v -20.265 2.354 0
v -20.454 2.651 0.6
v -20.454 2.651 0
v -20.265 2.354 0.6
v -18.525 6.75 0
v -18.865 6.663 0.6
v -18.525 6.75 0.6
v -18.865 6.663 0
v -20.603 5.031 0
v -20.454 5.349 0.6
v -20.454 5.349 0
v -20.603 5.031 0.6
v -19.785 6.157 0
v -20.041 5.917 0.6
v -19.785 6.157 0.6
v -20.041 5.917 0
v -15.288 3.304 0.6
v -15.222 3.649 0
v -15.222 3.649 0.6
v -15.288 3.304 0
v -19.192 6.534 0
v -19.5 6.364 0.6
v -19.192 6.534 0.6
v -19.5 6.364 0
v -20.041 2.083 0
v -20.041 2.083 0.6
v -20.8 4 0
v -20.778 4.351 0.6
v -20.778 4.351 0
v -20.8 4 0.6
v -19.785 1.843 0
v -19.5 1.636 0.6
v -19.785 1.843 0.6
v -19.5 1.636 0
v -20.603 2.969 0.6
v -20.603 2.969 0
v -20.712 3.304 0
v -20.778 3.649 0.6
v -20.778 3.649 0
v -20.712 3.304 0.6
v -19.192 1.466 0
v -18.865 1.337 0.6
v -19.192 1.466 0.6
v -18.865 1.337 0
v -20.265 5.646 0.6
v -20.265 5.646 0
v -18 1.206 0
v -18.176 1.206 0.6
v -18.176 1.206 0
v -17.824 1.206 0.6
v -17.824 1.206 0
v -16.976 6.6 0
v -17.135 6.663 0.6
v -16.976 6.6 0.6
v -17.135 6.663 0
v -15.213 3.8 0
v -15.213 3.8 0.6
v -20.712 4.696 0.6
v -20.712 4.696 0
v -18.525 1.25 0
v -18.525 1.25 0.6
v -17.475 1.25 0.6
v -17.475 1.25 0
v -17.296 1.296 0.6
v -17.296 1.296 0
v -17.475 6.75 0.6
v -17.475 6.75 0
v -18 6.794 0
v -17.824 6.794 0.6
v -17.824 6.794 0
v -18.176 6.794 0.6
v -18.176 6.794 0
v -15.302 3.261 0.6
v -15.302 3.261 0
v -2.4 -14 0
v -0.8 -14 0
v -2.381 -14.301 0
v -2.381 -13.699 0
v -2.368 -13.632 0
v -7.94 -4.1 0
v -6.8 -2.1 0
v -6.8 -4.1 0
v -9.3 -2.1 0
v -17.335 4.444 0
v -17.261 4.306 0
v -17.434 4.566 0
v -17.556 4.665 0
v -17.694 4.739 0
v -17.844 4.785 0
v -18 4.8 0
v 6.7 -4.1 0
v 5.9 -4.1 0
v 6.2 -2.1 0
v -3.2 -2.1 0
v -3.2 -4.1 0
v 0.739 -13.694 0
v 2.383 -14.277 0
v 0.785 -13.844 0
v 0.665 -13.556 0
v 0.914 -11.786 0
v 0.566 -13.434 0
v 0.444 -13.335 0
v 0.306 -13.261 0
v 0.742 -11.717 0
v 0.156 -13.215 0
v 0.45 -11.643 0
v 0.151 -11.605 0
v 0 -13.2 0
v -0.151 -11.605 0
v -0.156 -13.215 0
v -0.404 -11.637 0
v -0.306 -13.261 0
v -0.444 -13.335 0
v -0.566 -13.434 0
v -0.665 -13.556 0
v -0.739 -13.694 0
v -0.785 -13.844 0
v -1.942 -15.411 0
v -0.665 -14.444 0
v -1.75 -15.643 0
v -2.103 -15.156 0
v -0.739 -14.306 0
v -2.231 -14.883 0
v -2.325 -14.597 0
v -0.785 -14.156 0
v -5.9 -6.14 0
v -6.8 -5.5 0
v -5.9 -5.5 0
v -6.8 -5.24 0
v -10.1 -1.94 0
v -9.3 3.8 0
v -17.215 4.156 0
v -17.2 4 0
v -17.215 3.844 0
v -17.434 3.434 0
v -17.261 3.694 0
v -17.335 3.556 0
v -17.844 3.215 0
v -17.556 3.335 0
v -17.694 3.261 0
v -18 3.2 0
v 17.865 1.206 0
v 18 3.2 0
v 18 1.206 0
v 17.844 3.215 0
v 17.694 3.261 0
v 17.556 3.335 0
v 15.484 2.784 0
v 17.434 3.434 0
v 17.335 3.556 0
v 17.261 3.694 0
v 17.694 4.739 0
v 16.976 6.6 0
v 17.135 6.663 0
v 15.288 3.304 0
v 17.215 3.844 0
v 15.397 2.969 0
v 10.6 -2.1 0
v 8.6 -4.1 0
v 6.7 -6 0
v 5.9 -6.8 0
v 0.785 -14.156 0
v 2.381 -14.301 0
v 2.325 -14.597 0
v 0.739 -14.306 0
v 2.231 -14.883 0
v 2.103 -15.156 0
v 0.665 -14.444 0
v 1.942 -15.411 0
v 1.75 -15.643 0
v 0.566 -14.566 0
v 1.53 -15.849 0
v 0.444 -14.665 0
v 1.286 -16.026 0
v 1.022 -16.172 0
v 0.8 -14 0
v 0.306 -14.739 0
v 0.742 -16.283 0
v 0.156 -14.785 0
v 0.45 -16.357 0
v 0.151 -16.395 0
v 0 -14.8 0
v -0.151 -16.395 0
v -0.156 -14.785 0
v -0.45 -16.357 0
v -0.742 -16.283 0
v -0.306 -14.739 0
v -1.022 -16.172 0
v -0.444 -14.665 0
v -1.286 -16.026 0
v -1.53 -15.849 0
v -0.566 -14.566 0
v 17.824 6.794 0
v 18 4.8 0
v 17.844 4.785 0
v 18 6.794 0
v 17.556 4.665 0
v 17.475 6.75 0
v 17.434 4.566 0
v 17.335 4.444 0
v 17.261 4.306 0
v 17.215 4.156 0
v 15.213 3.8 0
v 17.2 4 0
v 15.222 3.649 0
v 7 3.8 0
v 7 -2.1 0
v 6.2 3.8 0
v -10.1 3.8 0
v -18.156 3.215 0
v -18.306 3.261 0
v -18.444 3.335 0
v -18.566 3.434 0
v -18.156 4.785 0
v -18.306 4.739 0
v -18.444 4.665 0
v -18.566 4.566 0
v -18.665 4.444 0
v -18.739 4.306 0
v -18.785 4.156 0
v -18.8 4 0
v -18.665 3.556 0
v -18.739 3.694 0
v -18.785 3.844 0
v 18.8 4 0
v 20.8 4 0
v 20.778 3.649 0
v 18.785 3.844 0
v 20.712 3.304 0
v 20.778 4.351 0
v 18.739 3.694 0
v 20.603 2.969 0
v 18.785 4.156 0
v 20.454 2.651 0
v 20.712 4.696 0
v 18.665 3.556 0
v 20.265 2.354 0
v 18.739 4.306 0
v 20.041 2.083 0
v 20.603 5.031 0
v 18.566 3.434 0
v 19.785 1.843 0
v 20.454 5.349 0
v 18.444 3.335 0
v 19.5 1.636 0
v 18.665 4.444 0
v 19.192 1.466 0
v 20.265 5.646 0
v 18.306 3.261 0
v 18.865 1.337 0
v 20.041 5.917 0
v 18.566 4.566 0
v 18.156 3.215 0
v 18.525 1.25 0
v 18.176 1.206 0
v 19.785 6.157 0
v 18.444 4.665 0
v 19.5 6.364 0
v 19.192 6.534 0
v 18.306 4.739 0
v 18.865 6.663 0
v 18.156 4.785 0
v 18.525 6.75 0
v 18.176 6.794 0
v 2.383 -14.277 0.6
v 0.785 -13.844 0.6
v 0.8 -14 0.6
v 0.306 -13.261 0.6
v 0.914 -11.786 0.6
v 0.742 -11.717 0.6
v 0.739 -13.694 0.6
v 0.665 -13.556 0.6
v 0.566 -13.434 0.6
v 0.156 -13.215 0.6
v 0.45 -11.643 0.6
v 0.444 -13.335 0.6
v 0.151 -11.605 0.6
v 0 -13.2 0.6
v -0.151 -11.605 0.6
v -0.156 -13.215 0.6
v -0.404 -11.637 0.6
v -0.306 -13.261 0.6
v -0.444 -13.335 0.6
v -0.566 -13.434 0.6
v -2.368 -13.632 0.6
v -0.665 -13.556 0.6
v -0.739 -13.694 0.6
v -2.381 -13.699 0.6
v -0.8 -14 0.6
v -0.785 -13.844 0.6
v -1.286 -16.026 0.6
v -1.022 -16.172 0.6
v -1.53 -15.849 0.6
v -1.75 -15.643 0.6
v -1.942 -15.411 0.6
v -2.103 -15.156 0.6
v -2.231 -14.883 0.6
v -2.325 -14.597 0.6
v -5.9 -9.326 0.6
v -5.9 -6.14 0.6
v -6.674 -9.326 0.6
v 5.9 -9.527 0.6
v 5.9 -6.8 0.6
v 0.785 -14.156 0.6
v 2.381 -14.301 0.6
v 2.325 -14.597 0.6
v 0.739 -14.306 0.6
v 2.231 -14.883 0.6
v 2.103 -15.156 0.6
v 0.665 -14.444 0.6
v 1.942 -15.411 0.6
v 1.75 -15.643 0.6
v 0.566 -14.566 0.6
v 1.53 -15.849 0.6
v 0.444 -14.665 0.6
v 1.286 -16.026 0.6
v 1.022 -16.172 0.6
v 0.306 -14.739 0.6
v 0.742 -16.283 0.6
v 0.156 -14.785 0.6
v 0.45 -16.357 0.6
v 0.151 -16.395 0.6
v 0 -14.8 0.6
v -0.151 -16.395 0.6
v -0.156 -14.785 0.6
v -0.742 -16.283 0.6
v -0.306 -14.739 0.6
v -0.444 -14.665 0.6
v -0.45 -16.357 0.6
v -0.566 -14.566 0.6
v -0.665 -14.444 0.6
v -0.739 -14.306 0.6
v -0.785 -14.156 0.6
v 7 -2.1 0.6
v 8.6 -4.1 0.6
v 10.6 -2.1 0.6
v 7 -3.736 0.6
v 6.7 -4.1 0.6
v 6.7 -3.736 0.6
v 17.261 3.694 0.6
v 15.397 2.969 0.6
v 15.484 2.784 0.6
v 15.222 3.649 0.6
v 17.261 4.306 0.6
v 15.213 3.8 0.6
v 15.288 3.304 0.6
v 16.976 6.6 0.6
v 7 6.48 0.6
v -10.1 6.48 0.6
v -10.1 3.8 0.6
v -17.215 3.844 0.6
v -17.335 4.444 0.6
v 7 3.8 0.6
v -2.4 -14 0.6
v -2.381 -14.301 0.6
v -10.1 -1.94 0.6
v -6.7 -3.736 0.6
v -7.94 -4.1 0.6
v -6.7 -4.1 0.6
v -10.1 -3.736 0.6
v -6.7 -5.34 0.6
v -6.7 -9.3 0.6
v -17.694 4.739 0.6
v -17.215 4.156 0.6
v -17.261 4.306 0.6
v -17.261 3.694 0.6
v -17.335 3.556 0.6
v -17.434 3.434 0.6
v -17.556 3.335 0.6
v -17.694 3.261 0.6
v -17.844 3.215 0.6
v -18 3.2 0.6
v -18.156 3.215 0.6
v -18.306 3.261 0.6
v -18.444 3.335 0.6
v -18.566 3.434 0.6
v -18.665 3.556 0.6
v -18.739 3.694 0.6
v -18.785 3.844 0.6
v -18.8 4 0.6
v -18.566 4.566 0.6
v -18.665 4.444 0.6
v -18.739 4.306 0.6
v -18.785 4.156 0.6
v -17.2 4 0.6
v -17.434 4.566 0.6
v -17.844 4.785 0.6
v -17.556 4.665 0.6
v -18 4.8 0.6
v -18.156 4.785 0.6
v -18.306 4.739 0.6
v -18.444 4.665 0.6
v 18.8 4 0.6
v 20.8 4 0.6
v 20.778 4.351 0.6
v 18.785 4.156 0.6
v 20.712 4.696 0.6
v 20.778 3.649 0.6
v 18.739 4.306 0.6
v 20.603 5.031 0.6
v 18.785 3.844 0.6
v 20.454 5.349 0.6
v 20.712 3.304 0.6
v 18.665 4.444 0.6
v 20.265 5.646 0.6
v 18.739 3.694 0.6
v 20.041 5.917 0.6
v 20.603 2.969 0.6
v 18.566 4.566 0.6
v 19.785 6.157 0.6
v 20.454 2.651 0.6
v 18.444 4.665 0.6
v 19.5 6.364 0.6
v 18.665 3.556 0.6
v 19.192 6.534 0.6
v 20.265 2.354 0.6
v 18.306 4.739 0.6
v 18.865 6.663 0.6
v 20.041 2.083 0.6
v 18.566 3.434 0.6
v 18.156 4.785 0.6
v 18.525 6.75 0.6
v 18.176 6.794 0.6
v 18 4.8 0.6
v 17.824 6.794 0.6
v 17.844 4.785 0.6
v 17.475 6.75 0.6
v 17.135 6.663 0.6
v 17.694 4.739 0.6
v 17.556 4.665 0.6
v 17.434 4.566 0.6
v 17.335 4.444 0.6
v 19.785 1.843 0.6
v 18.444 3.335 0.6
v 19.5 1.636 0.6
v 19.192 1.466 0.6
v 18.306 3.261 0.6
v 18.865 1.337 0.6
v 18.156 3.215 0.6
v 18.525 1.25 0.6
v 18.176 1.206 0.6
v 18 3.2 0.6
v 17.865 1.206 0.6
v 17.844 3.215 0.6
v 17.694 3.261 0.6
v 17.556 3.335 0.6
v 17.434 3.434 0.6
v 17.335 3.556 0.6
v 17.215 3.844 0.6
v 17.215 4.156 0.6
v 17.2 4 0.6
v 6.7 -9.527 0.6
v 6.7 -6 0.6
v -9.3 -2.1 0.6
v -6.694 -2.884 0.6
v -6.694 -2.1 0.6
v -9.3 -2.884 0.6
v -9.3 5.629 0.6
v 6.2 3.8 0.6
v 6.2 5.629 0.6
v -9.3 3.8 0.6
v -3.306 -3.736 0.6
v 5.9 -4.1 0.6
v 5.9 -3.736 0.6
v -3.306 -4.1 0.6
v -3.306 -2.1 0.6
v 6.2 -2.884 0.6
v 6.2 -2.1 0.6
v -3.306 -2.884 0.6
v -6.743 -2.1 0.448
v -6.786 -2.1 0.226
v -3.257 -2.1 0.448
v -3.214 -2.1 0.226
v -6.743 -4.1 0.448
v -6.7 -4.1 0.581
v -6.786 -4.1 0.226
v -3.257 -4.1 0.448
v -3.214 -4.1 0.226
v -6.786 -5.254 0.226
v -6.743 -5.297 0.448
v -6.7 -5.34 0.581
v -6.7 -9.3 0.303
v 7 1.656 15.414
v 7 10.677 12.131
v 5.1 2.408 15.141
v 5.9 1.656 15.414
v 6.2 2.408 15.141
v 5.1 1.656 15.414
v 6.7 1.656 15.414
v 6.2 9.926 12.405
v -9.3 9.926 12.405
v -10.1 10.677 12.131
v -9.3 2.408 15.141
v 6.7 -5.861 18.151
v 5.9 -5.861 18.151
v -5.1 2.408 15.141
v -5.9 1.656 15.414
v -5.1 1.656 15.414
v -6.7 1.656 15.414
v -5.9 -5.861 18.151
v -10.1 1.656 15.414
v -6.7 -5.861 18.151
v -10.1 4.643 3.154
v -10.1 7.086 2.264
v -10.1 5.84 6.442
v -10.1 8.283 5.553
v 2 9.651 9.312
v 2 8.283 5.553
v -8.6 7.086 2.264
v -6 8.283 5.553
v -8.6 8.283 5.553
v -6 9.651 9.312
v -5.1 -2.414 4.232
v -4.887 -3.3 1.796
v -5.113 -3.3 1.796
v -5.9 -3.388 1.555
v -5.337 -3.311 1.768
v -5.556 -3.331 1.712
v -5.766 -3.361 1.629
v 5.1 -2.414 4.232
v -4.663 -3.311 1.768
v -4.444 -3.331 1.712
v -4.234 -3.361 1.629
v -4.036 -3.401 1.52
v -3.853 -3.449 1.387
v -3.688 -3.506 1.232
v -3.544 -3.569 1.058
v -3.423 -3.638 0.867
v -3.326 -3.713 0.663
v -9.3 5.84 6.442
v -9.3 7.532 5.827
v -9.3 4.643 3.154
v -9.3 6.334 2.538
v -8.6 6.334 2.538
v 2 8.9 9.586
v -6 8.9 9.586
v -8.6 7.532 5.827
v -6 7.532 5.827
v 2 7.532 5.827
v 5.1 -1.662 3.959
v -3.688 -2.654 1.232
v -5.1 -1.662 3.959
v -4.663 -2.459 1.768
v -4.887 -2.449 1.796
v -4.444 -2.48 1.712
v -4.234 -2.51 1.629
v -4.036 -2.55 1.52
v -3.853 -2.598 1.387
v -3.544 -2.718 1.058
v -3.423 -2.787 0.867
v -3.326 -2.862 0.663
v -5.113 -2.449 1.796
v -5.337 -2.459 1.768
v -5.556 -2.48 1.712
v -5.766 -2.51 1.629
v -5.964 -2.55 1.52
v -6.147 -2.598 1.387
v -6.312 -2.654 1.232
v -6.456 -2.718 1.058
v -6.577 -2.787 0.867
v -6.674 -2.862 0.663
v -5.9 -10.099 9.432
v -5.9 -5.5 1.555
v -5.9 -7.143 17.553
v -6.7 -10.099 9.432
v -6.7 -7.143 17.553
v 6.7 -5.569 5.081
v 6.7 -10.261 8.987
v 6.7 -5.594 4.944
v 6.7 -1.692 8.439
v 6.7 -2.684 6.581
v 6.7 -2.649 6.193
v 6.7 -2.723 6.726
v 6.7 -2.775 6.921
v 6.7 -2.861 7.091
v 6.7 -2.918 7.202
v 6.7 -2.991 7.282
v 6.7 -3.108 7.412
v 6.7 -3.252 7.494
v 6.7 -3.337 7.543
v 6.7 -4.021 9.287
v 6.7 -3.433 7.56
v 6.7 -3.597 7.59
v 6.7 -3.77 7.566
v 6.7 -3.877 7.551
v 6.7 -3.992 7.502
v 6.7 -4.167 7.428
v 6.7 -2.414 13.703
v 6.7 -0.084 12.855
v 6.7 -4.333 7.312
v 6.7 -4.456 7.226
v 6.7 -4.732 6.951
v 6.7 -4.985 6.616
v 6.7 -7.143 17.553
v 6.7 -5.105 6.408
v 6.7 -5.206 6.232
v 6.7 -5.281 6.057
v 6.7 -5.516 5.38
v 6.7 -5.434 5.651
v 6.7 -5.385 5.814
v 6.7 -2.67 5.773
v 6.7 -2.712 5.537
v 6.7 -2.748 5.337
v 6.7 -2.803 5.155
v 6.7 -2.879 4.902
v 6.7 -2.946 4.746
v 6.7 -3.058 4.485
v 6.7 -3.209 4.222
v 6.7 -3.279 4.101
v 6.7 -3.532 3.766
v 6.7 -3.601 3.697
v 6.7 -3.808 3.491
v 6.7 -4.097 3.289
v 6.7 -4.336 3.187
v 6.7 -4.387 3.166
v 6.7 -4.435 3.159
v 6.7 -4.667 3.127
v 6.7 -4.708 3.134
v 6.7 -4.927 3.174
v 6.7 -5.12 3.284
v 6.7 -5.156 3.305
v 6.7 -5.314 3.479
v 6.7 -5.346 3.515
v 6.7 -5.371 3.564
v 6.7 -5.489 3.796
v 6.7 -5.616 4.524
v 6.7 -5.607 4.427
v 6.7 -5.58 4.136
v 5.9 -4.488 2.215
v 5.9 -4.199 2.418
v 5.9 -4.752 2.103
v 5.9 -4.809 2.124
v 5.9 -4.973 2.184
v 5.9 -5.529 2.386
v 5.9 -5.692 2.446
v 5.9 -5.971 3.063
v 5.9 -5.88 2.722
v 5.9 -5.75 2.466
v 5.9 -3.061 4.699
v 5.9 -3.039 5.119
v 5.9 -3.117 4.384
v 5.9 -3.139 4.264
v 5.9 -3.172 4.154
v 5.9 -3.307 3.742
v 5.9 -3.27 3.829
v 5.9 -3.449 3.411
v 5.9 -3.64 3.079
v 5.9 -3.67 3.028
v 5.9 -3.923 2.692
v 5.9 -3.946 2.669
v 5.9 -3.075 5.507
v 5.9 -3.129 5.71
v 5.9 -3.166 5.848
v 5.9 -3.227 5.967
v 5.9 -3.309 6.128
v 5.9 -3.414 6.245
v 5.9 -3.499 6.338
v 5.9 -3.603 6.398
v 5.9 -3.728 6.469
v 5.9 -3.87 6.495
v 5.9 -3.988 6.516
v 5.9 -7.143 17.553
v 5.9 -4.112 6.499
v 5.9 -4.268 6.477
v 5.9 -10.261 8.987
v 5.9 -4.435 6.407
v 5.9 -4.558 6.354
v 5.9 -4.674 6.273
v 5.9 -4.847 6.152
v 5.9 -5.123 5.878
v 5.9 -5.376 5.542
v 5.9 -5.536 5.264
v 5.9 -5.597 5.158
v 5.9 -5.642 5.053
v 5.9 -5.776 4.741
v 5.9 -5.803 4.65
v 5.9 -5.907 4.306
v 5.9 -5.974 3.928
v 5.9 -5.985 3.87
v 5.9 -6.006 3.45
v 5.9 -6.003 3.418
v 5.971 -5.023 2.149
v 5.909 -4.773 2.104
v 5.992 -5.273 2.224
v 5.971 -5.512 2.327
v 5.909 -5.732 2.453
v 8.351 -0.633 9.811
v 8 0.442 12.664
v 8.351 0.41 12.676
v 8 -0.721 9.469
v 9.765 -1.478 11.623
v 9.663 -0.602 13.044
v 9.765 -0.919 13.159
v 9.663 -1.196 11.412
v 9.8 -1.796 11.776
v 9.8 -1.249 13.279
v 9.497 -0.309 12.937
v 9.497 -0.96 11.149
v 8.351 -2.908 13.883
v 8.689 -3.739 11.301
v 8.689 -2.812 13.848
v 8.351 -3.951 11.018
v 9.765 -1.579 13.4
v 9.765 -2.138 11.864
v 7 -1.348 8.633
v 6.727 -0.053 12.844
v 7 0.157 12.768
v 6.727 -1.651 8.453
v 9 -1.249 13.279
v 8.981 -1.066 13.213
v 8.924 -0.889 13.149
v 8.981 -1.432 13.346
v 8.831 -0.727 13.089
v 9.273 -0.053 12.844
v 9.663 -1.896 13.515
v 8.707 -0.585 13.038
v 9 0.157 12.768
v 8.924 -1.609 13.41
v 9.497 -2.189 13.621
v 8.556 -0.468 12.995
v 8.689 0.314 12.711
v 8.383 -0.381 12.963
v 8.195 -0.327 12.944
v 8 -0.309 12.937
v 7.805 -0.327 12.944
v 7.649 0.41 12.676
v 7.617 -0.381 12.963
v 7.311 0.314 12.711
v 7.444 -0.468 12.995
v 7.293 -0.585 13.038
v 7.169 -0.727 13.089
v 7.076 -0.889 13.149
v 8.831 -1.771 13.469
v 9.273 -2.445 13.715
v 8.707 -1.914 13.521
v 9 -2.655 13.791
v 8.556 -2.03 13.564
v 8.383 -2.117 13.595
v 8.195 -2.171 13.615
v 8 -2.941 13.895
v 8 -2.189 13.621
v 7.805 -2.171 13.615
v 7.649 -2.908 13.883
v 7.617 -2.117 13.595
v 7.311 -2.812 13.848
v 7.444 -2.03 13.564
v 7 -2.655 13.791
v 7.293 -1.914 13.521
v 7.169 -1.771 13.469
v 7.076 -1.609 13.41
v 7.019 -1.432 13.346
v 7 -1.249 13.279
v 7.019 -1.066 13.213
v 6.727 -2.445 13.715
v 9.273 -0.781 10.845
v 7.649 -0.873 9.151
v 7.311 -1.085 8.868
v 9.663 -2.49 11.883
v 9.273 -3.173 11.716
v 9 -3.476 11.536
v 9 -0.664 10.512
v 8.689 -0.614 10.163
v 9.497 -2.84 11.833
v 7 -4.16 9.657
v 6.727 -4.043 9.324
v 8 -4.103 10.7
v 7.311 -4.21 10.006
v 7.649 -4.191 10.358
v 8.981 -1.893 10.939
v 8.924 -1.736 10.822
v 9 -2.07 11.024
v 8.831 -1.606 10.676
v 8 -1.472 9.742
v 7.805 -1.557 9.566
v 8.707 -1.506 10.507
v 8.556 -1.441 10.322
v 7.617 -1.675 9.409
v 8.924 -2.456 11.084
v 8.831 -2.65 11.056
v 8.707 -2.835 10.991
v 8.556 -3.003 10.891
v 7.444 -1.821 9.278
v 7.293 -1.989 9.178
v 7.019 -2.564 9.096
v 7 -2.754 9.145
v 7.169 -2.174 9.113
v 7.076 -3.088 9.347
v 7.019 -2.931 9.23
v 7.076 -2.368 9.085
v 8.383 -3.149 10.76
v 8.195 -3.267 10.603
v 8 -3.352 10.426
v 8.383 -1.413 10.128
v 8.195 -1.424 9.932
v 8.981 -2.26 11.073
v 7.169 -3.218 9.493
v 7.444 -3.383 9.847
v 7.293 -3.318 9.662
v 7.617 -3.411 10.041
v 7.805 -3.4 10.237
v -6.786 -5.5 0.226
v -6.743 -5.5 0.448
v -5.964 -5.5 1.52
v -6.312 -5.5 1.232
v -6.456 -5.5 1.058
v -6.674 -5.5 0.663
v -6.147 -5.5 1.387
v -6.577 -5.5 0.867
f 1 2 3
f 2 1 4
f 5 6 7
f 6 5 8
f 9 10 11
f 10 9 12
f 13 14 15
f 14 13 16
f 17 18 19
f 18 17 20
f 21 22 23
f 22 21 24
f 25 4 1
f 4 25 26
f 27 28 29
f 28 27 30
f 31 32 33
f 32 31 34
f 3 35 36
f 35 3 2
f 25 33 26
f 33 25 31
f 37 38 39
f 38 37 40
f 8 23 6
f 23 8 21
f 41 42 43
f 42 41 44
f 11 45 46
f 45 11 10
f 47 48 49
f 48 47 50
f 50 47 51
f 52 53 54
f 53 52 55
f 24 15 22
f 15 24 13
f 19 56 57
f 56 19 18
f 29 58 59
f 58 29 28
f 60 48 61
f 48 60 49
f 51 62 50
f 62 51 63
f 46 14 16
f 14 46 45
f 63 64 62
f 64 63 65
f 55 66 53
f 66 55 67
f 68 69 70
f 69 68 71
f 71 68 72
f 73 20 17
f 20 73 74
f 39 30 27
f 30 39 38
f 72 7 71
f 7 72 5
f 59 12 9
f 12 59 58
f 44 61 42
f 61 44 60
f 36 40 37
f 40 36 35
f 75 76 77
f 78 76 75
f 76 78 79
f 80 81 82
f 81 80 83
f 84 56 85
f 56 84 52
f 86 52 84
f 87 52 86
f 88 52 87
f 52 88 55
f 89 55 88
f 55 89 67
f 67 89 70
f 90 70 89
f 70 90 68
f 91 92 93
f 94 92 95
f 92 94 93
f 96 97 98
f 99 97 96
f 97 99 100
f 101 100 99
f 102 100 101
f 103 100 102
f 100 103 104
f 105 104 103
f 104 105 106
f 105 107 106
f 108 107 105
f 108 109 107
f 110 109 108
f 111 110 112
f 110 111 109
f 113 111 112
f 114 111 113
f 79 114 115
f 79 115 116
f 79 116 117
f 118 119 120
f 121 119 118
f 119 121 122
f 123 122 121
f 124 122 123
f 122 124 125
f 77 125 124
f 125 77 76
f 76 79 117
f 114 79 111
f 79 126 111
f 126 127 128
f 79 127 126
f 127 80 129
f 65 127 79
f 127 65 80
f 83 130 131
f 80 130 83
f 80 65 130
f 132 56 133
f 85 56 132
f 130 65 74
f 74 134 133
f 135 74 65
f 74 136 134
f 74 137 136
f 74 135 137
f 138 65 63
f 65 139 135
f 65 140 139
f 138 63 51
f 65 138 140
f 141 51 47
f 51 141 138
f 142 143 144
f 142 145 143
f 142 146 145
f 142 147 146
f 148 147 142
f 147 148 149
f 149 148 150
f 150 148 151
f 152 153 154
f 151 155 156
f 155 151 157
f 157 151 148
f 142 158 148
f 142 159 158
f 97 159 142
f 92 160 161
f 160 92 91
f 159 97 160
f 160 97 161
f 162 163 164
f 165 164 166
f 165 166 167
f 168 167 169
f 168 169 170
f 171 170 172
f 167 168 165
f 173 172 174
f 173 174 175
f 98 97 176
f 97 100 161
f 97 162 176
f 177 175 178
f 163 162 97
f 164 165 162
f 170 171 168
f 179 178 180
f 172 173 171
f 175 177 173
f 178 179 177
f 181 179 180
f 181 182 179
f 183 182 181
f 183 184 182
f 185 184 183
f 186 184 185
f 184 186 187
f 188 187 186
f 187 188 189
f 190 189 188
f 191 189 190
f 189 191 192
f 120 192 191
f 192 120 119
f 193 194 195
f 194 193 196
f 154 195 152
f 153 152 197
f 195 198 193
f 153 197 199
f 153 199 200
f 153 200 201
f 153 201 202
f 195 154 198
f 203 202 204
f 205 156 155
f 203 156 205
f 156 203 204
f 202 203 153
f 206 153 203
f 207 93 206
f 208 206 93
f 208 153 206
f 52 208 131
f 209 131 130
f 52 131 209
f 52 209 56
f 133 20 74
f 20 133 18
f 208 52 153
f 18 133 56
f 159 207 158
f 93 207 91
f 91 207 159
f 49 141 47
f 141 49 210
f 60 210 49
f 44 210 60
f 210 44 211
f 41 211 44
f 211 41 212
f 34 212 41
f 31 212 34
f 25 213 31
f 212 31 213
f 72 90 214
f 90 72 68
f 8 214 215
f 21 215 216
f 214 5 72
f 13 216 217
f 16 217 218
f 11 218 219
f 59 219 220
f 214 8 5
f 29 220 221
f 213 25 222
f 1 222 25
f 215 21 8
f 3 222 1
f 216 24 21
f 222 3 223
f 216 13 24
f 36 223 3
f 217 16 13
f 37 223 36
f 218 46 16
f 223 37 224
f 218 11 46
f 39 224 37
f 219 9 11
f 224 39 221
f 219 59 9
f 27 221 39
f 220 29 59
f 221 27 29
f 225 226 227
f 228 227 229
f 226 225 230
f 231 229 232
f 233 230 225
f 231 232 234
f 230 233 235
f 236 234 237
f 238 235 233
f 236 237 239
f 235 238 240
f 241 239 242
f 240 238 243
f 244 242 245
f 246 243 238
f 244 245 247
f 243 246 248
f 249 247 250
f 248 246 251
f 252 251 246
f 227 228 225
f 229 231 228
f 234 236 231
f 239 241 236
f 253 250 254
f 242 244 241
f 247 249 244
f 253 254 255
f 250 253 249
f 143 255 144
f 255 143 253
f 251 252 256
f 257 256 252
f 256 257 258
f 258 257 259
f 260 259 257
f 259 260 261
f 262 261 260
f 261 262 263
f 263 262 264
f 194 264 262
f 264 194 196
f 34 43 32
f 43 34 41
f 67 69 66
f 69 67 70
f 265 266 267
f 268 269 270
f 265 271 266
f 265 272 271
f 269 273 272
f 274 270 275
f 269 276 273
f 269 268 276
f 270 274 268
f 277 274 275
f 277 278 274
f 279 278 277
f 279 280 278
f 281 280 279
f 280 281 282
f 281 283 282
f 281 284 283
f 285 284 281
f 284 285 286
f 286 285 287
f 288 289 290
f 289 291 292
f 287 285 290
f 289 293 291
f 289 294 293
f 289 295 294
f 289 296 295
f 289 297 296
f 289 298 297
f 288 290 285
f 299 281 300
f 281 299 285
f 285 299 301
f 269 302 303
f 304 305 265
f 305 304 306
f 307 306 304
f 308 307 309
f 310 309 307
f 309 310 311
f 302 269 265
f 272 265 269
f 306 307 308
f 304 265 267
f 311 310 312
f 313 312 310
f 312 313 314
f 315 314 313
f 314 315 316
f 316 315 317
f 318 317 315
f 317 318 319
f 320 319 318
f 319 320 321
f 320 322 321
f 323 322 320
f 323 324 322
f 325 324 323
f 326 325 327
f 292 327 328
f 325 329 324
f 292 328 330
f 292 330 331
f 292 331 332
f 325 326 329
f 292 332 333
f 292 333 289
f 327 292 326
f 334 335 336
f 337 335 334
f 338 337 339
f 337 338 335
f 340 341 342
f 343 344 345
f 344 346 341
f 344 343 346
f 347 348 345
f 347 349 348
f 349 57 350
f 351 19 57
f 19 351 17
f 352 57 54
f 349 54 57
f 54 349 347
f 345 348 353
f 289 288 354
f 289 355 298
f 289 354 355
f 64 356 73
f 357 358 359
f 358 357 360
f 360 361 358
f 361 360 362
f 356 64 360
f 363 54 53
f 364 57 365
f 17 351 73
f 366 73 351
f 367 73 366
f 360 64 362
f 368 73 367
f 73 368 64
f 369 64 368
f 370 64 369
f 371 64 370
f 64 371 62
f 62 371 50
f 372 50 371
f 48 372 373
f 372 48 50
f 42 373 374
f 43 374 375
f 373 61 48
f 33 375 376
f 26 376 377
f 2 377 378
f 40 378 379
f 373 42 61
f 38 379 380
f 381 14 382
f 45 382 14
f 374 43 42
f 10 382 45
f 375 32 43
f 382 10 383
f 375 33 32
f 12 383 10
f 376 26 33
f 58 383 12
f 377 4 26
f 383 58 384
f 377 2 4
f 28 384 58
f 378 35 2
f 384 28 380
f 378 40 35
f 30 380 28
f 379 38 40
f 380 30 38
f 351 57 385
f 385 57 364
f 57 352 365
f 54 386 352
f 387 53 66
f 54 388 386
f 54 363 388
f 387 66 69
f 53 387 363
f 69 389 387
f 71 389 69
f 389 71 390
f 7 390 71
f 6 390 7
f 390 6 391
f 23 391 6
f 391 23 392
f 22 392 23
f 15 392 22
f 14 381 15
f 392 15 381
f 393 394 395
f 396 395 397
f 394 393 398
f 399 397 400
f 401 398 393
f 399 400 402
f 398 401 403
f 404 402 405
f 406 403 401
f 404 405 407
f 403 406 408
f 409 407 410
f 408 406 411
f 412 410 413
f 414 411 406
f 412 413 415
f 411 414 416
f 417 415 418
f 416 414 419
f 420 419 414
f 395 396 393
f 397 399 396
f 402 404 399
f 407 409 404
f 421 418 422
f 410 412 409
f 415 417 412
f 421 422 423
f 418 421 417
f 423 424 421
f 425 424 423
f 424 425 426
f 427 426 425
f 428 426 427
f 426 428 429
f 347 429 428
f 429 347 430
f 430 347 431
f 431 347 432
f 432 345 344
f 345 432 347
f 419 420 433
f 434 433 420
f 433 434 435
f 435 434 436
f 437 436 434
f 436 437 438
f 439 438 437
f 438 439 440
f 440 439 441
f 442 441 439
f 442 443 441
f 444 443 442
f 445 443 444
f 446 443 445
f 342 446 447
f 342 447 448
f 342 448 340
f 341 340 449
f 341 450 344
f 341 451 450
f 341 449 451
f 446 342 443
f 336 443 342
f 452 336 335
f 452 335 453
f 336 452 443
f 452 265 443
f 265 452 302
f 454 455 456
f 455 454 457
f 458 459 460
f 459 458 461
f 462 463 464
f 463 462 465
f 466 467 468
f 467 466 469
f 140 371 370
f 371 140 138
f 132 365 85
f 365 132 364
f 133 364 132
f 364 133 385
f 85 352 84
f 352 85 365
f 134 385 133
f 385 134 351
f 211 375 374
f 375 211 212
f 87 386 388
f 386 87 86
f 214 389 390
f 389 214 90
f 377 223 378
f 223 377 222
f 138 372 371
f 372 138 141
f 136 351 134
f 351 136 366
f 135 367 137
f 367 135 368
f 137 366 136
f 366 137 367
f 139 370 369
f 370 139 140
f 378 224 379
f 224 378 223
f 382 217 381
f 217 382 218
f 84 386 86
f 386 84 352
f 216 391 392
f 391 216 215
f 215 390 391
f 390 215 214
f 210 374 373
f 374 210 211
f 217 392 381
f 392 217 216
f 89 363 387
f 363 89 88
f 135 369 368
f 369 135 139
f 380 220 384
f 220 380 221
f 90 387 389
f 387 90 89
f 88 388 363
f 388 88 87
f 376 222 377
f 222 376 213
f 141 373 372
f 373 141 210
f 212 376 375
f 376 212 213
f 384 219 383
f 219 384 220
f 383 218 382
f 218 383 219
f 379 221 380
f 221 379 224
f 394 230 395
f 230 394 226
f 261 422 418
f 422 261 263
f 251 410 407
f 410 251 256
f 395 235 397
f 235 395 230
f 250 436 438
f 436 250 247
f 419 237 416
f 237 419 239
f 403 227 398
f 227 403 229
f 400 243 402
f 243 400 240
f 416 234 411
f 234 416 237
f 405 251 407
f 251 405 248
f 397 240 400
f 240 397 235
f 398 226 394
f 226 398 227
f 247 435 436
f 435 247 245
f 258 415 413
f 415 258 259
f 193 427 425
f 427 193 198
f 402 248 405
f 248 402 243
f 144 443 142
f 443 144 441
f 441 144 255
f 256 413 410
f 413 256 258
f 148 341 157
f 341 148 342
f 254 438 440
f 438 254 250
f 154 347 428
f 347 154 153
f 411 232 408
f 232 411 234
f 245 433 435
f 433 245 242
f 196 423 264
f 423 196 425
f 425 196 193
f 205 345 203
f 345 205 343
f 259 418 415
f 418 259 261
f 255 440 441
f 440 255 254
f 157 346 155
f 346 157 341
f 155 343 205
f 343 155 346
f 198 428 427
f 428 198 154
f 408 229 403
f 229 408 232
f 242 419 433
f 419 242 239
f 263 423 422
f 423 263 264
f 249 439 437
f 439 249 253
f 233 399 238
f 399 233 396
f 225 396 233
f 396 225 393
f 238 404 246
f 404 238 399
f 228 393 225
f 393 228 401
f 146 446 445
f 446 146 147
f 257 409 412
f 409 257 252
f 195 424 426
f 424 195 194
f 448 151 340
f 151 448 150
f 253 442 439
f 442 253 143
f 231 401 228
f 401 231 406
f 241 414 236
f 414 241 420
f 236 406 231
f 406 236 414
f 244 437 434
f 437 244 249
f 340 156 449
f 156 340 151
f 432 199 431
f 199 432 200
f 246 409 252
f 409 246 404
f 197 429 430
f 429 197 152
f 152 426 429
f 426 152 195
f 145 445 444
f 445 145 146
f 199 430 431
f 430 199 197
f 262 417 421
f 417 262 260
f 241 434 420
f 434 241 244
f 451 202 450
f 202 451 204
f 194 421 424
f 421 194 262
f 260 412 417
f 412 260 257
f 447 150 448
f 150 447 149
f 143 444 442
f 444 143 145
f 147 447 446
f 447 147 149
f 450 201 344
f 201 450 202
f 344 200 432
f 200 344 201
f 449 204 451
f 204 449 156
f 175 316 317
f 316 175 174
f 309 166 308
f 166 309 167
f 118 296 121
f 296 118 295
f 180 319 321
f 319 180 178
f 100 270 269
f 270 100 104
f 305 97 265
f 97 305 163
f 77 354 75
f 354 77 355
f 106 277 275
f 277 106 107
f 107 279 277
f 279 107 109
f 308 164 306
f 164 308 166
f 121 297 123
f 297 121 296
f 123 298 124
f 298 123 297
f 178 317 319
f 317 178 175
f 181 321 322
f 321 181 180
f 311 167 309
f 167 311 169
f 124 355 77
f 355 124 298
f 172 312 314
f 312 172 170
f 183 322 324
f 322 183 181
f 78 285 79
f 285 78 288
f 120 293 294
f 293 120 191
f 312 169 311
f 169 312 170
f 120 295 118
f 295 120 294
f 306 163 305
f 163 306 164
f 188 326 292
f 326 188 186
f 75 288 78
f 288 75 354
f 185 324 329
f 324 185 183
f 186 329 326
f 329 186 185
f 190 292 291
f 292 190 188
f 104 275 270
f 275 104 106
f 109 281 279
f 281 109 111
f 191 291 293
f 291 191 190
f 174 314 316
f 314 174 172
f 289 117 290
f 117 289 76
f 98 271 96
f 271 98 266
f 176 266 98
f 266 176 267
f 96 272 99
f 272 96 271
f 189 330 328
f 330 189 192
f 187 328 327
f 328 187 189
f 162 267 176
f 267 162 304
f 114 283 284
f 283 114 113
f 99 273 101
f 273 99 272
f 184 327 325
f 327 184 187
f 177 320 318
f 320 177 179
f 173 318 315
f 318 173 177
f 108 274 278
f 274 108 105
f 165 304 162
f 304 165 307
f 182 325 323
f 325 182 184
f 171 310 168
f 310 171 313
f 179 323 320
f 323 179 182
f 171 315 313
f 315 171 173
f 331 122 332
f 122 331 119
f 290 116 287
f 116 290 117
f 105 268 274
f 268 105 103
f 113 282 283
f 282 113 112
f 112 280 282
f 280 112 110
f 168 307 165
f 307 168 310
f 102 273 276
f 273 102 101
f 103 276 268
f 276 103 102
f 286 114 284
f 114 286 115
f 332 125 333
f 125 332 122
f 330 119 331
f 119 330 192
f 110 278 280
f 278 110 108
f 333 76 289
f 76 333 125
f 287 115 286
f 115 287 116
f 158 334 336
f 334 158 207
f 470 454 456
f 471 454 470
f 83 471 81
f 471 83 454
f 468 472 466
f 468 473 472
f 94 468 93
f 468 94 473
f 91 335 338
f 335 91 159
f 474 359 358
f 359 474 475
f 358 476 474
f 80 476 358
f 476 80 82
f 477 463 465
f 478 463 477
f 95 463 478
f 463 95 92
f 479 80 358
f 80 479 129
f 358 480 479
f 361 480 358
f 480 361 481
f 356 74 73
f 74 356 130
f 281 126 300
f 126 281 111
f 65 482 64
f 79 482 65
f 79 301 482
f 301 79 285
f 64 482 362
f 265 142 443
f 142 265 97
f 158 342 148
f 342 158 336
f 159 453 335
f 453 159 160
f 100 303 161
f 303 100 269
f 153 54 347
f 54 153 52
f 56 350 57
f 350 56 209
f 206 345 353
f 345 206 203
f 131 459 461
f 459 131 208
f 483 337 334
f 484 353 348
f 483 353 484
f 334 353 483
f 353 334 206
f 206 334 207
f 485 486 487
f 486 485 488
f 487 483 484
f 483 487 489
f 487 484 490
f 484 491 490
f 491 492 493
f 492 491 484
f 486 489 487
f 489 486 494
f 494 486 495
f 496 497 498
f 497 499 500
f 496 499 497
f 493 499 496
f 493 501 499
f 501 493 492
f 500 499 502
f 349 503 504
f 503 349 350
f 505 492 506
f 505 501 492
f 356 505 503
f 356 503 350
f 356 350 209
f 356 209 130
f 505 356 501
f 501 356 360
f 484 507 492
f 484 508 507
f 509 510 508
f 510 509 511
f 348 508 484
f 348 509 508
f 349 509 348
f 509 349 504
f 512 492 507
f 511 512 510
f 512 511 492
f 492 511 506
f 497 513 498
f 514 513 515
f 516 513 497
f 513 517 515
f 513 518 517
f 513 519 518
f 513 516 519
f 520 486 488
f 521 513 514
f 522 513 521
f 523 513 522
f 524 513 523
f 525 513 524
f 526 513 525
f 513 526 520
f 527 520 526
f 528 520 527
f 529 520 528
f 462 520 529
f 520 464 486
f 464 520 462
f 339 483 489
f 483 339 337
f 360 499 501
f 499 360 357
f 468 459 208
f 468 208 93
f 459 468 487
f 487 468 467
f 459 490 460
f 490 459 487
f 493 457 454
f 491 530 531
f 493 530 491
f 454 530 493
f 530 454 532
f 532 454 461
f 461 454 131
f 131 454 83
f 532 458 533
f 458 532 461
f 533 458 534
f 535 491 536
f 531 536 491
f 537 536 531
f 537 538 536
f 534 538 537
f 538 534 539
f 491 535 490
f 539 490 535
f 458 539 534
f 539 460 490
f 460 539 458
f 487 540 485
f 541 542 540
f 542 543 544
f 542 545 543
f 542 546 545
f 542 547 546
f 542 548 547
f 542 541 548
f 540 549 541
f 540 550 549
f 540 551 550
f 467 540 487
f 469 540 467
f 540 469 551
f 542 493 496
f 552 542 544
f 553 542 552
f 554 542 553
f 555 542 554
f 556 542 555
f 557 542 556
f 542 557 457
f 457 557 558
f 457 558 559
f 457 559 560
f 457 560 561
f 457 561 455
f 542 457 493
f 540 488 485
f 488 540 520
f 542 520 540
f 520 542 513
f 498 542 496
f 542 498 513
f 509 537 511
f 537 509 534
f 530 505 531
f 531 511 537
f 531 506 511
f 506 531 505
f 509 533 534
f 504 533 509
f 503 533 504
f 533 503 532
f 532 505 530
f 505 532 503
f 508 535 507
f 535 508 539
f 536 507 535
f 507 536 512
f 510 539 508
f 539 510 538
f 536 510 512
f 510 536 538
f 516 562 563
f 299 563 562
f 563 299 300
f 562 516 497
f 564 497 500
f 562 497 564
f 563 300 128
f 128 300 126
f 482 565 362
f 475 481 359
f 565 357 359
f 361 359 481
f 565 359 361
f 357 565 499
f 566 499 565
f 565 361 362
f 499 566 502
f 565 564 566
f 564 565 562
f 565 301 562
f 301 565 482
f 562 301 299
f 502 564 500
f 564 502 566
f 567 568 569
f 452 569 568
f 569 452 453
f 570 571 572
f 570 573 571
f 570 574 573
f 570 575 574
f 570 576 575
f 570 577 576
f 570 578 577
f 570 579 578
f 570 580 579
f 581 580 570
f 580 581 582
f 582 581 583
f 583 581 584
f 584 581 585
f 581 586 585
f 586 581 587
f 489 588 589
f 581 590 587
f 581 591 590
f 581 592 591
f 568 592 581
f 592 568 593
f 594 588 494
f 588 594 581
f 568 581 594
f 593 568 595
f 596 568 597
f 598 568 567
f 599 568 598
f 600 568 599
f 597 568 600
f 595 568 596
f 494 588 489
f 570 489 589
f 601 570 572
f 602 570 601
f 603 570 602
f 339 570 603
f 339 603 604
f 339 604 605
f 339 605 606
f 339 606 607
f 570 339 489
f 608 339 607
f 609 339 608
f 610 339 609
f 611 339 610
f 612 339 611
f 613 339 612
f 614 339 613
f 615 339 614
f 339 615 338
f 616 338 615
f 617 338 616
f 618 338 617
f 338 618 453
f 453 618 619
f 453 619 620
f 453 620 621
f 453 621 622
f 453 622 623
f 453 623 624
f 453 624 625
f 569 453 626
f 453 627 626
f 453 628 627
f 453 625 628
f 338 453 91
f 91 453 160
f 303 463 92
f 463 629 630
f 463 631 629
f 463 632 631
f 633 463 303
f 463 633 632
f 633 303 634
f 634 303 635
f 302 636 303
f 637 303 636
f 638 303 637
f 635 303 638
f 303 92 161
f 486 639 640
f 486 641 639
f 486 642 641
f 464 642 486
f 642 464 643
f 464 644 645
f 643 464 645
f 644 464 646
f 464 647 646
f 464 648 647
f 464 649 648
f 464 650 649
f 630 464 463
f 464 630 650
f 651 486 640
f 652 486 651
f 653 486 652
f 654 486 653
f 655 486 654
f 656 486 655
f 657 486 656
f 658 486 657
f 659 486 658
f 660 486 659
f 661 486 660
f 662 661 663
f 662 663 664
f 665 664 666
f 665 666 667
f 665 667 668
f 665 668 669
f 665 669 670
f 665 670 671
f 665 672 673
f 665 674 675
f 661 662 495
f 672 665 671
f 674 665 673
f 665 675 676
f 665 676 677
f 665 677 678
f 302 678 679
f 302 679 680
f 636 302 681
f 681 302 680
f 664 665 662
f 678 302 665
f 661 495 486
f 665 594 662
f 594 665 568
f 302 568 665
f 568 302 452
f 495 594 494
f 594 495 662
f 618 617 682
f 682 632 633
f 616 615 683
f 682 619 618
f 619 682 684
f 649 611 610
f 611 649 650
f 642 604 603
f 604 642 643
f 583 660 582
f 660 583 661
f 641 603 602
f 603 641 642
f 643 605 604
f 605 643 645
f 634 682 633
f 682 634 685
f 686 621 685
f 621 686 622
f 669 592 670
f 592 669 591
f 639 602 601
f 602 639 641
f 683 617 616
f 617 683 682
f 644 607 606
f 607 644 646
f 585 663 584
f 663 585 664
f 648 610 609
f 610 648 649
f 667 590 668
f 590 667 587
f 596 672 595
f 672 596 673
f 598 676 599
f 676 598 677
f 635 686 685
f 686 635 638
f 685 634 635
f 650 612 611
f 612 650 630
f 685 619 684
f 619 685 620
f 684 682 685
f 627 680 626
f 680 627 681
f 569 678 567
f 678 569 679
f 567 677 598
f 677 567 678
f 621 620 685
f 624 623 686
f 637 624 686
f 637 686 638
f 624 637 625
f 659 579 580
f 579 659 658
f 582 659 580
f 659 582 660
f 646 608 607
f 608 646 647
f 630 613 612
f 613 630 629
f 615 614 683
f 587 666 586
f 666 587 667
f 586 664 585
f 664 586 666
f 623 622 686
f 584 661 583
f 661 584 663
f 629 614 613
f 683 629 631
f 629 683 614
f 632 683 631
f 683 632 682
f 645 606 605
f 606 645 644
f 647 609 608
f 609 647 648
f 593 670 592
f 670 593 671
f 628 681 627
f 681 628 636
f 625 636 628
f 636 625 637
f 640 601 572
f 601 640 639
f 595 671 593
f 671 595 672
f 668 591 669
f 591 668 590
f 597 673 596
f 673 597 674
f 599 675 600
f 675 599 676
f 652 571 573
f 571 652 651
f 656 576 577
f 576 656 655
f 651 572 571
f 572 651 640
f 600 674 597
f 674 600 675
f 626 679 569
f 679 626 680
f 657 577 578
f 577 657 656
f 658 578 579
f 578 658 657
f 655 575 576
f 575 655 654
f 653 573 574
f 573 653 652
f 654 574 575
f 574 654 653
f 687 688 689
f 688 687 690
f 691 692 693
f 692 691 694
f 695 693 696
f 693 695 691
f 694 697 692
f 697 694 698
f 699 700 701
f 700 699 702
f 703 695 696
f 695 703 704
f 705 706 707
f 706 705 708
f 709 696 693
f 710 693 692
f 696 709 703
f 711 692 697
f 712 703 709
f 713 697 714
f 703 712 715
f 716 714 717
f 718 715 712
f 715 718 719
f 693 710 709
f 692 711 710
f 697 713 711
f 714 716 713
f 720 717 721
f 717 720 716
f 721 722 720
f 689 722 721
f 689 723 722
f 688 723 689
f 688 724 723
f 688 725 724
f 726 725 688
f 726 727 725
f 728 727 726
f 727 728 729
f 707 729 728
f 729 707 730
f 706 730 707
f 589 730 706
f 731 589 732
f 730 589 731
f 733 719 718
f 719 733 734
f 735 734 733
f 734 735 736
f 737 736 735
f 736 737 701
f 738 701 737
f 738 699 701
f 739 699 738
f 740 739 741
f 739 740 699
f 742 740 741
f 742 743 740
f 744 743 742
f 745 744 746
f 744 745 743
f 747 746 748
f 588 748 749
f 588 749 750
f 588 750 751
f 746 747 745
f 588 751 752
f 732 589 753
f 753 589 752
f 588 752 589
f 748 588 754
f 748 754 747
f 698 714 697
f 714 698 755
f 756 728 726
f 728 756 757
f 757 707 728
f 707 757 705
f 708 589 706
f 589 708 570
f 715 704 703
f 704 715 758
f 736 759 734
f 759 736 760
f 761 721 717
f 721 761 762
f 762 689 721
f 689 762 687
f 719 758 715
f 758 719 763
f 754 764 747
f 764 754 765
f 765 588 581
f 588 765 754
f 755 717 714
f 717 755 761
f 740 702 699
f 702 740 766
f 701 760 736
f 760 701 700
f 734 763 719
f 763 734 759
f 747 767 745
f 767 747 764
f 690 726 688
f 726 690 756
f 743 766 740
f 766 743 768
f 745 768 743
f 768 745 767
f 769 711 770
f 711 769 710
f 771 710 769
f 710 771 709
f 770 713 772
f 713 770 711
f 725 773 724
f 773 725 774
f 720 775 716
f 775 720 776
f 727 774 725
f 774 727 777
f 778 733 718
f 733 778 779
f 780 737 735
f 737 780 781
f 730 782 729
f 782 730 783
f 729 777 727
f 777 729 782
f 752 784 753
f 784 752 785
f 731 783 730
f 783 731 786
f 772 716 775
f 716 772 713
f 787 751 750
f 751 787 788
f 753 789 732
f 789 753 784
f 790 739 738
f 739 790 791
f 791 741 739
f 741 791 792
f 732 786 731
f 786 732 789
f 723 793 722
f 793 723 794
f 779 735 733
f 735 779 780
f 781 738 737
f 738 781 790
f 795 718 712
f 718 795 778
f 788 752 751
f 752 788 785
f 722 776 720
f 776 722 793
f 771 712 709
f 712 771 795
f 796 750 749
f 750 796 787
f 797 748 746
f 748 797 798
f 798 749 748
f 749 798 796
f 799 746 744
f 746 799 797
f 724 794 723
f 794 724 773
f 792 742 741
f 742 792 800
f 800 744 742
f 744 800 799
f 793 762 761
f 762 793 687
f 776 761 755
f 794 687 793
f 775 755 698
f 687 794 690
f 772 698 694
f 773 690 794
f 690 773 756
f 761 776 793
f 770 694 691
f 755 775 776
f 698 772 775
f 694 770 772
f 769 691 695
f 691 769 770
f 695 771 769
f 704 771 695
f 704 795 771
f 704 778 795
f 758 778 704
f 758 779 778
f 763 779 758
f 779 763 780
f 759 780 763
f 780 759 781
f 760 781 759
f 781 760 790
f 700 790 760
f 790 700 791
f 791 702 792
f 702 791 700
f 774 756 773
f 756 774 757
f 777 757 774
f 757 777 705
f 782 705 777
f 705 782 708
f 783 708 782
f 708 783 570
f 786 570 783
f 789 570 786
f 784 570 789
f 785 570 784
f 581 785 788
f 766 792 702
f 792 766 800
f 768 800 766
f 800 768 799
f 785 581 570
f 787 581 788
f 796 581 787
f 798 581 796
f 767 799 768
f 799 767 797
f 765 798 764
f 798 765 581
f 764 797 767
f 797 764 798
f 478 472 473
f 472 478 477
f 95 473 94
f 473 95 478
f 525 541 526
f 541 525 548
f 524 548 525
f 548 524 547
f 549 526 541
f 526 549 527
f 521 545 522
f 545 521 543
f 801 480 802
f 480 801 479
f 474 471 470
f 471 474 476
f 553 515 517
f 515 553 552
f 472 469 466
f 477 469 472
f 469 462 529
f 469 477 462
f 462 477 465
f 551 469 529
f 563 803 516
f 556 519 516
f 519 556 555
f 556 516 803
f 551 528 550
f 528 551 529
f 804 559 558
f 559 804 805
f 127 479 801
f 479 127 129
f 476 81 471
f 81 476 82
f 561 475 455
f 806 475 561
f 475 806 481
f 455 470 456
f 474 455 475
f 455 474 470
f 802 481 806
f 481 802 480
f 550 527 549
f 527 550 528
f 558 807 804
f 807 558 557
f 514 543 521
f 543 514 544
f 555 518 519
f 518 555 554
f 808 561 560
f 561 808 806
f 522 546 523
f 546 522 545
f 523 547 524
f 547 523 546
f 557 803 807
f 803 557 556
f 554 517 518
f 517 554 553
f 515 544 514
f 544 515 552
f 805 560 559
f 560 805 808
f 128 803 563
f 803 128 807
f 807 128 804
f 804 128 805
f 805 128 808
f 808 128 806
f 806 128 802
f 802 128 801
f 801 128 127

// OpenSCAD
// Eachine AIO FPV mount
// E011 quadcopter

camWidth = 15.5; // wall thickness .8mm = 17.1 mm outer box size
camDepth = 8;
camHeight = 12;

camLensWidth = 10.2;
camLensOffsetRight = 5; // distance from right side of camera to right side of lens
camLensOffsetBottom = 1;
lensDepth = 8;

LED_CutoutWidth = 8;
LED_CutoutHeight = 4;
LED_OffsetRight = 3.3;
LED_OffsetBottom = 5;

//switchCutoutWidth = 5;
//switchCutoutHeight = 3.2;
//switchOffsetRight = 9.8;
//switchOffsetBottom = 9;

wireCutoutWidth = 3;
wireCutoutHeight = 3.5;
wireOffsetRight = -1.5;
wireOffsetFront = 7;
wireOffsetBottom = 2.5;

wallThickness = 0.8; // 2x .4mm extrusion width

baseHeight = 0.6;

cameraAngle = -20;

antennaDiameter = 2;

module tx01_mount() {

    difference() {
        union() {
            e010_bottom_plate();
            translate ([-((camLensWidth/2)+camLensOffsetRight),-4.5,-1.5]) rotate ([cameraAngle,0,0]) tx01_box();
        }
        // xtal cutout
        translate ([-5,-1,0]) rotate([90,0,0]) cylinder(r=1.8, h=9, center=true, $fn=50);
        // cap cutout
        //translate ([-5,3,-0.2]) cube([3,7,1]);
        // bottom cutoff
        translate ([-18,-18,-36]) cube(36);
    }
}

module tx01_box() {
    difference() {
        // camera box outer size
        cube([camWidth+(wallThickness*2),camDepth+(wallThickness*2),camHeight+6], center=false);
        
        
        // main camera cutout
        translate ([wallThickness,wallThickness,-1]) cube([camWidth,camDepth,32]);
        
        // lens cutout
        translate ([camLensOffsetRight, -.2,camLensOffsetBottom+5.1]) cube([camLensWidth,3,14]);
        // wire cutout
        translate ([wireOffsetRight,wireOffsetFront,wireOffsetBottom+5]) cube ([3,wireCutoutWidth,wireCutoutHeight]);
        // LED cutout
        translate ([LED_OffsetRight+wallThickness,camDepth,LED_OffsetBottom+6]) cube ([LED_CutoutWidth,LED_CutoutHeight,4]);
        // switch cutout
        //translate ([switchOffsetRight+wallThickness,camDepth,switchOffsetBottom+6]) cube ([switchCutoutWidth,switchCutoutHeight,4]);
    }
    
    // right lens protector
    difference() 
    {
        // main baffle
        translate ([camLensOffsetRight-wallThickness*2,-lensDepth-1,-6]) cube([wallThickness,lensDepth+1,camHeight+12]);
        // bottom chamfer
        translate ([camLensOffsetRight-wallThickness*2-.1,-lensDepth-1,-3]) rotate ([25,0,0]) cube([55,4.8,55]);
        // top chamfer
        translate ([camLensOffsetRight-wallThickness*2-.1,-lensDepth-1,17]) rotate ([45,0,0]) cube([55,4.8,55]);
    }
    // left lens protector
    difference() 
    {
        // main baffle
        translate ([camLensOffsetRight+camLensWidth+wallThickness,-lensDepth-1,-6]) cube([wallThickness,lensDepth+1,camHeight+12]);
        // bottom chamfer
        translate ([camLensOffsetRight+camLensWidth+wallThickness-.2,-lensDepth-1,-3]) rotate ([25,0,0])  cube([55,4.6,55]);
        // top chamfer
        translate ([camLensOffsetRight+camLensWidth+wallThickness-.2,-lensDepth-1,17]) rotate ([45,0,0])  cube([55,4.6,55]);
        // hole through baffle
        translate ([camLensOffsetRight+camLensWidth+wallThickness-1,-2,4])rotate ([0,35,0]) cylinder(r=antennaDiameter/1.5,h=8,$fn=32);
    }
    
    // Antenna Mount
    difference() {
        translate ([camWidth+(wallThickness*3)+.2,-2,10]) cylinder(r=(antennaDiameter/2)+wallThickness,h=5,$fn=32);
        translate ([camWidth+(wallThickness*3)+.2,-2,9]) cylinder(r=(antennaDiameter/2),h=7,$fn=32);
        translate ([camWidth,-4,9]) rotate ([0,45,0]) cube ([8,8,8]);
    }
}


module e010_bottom_plate() {
    
    // mount left
    difference() {
        translate([-18,4,0]) cylinder(r=2.8,h=baseHeight,$fn=50);
        translate([-18,4,-0.5]) cylinder(r=0.8, h=2,$fn=32);
    }
    //mount right
    difference() {
        translate([18,4,0]) cylinder(r=2.8,h=baseHeight,$fn=50);
        translate([18,4,-0.5]) cylinder(r=0.8, h=2,$fn=32);
    }
    //mount front
    difference() {
        translate([0,-14,0]) cylinder(r=2.4,h=baseHeight,$fn=50);
        translate([0,-14,-0.5]) cylinder(r=0.8, h=2,$fn=32);
    }
    // beam front
    translate ([-11.9,-4.1,0]) cube ([23.9,2,baseHeight]);
    // right beam
    translate ([-17.5,1.5,0]) rotate ([0,0,-45]) cube ([22,2.8,baseHeight]); 
    // left beam
    translate ([16.7,4,0]) rotate ([0,0,225]) cube ([23.5,2.8,baseHeight]); 
    
    /*
    // back rounded corner right
    difference() {
        translate ([-5.5,13,0]) cylinder(r=2,h=baseHeight,$fn=50);
        translate ([-4,9.5,-0.5]) cylinder(r=3.55,h=2,$fn=50);
    }
    // back rounded corner left
    difference () {
        translate ([5.5,13,0]) cylinder(r=2,h=baseHeight,$fn=50);
        translate ([4,9.5,-0.5]) cylinder(r=3.55,h=2,$fn=50);        
    }
    translate ([-5.5,13,0]) cube ([11,2,baseHeight]);
    // back angle beam Right
    translate([-17,1.0,0]) rotate ([0,0,46.15]) cube([17, 2,baseHeight]);
    // back gusset right
    translate([-16.3,4.2,0]) rotate ([0,0,24]) cube([3,1.5,baseHeight]);
    
    // back angle beam Left
    translate([5.5,13.0,0]) rotate ([0,0,-46]) cube([16.7, 2,baseHeight]);
    // back gusset left
    translate([17,5.4,0]) rotate ([0,0,156]) cube([3,1.5,baseHeight]);
    
    */
    // middle beam
    translate([-17,3.8,0]) cube([34,2.8,baseHeight]);
}

tx01_mount();
